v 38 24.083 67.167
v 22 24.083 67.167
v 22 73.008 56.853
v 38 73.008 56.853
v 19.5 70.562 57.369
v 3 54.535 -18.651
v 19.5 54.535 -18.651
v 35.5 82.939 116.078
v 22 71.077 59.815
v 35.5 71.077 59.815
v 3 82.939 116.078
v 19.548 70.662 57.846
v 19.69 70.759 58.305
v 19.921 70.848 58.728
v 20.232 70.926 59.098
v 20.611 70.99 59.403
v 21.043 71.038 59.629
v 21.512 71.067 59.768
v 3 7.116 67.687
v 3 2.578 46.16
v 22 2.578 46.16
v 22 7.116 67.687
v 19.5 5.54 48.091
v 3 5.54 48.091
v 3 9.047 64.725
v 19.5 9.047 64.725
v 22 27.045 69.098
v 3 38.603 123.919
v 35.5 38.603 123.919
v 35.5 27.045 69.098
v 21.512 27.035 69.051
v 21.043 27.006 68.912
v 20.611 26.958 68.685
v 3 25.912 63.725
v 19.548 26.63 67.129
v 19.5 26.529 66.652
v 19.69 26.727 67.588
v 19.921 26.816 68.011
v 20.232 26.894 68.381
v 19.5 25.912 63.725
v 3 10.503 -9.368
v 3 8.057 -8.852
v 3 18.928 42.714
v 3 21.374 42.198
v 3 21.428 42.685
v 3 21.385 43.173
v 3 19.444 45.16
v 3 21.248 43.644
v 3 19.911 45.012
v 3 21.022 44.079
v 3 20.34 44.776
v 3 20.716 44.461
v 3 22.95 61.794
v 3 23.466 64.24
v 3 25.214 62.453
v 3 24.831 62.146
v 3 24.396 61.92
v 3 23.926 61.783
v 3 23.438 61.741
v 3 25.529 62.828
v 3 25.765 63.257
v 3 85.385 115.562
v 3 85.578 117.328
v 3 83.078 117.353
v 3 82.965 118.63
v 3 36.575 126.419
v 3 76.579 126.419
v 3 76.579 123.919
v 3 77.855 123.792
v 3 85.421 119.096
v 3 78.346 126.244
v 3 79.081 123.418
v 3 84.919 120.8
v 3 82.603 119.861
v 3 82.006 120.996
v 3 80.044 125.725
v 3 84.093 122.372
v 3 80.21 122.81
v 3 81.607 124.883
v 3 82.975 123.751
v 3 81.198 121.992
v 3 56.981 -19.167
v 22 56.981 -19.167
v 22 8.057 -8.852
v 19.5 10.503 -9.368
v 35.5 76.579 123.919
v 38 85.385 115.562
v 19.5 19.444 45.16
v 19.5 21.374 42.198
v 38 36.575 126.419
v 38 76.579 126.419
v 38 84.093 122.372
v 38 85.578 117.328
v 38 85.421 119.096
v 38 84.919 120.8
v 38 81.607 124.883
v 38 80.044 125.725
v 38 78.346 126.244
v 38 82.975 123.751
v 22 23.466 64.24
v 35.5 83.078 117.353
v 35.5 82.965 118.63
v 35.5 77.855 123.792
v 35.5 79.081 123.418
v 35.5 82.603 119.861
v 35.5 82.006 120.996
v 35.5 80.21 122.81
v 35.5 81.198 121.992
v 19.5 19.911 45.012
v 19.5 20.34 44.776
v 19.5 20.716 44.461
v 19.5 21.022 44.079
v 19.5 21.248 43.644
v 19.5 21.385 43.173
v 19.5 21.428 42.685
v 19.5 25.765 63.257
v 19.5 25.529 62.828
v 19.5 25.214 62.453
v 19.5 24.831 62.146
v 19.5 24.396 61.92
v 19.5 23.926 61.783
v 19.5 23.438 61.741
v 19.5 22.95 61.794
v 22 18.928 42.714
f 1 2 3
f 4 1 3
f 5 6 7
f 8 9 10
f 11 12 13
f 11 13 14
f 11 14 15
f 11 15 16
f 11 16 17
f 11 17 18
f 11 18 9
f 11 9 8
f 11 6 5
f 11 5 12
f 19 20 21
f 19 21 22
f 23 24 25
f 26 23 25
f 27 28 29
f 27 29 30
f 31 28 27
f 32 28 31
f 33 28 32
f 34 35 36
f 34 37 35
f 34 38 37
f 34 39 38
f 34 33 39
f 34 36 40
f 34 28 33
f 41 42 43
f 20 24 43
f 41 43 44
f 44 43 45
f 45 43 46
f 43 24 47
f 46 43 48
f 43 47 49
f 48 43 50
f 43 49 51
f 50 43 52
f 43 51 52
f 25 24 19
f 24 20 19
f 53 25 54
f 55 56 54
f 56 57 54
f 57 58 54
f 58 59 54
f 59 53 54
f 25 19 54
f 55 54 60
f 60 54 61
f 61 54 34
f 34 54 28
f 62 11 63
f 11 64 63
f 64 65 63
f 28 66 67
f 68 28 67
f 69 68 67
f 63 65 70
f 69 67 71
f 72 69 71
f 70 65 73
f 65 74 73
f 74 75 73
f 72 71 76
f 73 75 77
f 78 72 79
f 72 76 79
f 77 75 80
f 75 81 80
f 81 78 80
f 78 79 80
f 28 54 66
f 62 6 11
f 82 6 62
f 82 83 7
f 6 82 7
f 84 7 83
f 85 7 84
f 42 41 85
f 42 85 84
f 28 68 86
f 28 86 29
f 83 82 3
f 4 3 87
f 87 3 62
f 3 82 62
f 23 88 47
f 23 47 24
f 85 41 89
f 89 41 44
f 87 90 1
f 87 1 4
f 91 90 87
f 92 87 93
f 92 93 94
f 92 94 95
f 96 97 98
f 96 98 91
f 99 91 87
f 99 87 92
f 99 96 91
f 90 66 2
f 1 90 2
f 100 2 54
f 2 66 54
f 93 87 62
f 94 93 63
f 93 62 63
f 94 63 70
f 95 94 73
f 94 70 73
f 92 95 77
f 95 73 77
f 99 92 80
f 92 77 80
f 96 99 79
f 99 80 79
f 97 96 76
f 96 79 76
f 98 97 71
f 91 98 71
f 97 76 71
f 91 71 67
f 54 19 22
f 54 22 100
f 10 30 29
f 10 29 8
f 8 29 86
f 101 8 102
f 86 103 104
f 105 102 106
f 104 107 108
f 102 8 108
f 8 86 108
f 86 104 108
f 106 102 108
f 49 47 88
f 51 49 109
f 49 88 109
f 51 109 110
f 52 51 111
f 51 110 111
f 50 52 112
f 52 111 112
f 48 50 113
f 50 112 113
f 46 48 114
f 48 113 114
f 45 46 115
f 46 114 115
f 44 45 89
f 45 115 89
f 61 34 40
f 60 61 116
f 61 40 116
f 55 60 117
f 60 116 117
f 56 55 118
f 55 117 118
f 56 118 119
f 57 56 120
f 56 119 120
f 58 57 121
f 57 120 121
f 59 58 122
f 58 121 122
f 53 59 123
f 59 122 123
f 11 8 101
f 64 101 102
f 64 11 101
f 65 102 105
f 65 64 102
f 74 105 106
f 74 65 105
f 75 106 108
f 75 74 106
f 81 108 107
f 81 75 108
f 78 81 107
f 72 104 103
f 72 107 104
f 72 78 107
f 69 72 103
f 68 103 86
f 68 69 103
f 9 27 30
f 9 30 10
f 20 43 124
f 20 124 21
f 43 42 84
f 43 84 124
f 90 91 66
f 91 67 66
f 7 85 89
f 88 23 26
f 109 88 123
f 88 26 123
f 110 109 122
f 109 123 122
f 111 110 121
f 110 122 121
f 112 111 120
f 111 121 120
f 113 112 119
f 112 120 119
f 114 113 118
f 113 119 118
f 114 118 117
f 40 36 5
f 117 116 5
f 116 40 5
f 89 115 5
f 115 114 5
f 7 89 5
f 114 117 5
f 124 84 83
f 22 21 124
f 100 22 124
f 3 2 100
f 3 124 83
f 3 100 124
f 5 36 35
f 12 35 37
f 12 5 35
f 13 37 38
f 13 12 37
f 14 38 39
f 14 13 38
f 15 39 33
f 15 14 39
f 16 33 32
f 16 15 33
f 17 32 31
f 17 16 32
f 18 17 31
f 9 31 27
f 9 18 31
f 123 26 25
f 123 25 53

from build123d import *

# Parameters (mm, degrees)
PAD015_DEPTH   = 19
PAD016_DEPTH   = 16
THICKNESS001_T = -2.5


with BuildPart() as part:
    # Sketch039 → Pad015 (new body)
    with BuildSketch(Plane.YZ):
        with BuildLine():
            Line((56.9812455945, -19.1666932293), (85.3849313131, 115.5624248602))
            ThreePointArc((85.3849313131, 115.5624248602), (83.5681124, 123.0886932914), (76.5785062018, 126.4190014838))
            Line((76.5785062018, 126.4190014838), (36.5746674209, 126.4190014838))
            Line((23.4661256961, 64.2403714455), (36.5746674209, 126.4190014838))
            Line((7.1160182593, 67.687312386), (23.4661256961, 64.2403714455))
            Line((2.577719846, 46.1604954473), (7.1160182593, 67.687312386))
            Line((18.9278272829, 42.7135545068), (2.577719846, 46.1604954473))
            Line((8.0566616429, -8.8523786537), (18.9278272829, 42.7135545068))
            Line((56.9812455945, -19.1666932293), (8.0566616429, -8.8523786537))
        make_face()
    extrude(amount=PAD015_DEPTH)

    # Sketch040 (on Face11 of Pad015) → Pad016 (join)
    with BuildSketch(Plane.YZ.offset(19)):
        with BuildLine():
            Line((73.0077538223, 56.8529241183), (85.3849313131, 115.5624248602))
            ThreePointArc((85.3849313131, 115.5624248602), (83.5681124, 123.0886932914), (76.5785062018, 126.4190014838))
            Line((76.5785062018, 126.4190014838), (36.5746674209, 126.4190014838))
            Line((36.5746674209, 126.4190014838), (24.0831698707, 67.1672386939))
            Line((24.0831698707, 67.1672386939), (73.0077538223, 56.8529241183))
        make_face()
    extrude(amount=PAD016_DEPTH)

    # Thickness001
    thickness001_openings = [part.faces().sort_by_distance(p)[0] for p in [
        (0, 45.798185, 55.874797),
        (9.5, 32.518954, -14.009536),
    ]]
    offset(amount=THICKNESS001_T, openings=thickness001_openings)


with BuildPart() as part_1:
    # Body007 placement: moved
    add(part.part.moved(Location((3, 0, 0))))


solid = part_1.part
